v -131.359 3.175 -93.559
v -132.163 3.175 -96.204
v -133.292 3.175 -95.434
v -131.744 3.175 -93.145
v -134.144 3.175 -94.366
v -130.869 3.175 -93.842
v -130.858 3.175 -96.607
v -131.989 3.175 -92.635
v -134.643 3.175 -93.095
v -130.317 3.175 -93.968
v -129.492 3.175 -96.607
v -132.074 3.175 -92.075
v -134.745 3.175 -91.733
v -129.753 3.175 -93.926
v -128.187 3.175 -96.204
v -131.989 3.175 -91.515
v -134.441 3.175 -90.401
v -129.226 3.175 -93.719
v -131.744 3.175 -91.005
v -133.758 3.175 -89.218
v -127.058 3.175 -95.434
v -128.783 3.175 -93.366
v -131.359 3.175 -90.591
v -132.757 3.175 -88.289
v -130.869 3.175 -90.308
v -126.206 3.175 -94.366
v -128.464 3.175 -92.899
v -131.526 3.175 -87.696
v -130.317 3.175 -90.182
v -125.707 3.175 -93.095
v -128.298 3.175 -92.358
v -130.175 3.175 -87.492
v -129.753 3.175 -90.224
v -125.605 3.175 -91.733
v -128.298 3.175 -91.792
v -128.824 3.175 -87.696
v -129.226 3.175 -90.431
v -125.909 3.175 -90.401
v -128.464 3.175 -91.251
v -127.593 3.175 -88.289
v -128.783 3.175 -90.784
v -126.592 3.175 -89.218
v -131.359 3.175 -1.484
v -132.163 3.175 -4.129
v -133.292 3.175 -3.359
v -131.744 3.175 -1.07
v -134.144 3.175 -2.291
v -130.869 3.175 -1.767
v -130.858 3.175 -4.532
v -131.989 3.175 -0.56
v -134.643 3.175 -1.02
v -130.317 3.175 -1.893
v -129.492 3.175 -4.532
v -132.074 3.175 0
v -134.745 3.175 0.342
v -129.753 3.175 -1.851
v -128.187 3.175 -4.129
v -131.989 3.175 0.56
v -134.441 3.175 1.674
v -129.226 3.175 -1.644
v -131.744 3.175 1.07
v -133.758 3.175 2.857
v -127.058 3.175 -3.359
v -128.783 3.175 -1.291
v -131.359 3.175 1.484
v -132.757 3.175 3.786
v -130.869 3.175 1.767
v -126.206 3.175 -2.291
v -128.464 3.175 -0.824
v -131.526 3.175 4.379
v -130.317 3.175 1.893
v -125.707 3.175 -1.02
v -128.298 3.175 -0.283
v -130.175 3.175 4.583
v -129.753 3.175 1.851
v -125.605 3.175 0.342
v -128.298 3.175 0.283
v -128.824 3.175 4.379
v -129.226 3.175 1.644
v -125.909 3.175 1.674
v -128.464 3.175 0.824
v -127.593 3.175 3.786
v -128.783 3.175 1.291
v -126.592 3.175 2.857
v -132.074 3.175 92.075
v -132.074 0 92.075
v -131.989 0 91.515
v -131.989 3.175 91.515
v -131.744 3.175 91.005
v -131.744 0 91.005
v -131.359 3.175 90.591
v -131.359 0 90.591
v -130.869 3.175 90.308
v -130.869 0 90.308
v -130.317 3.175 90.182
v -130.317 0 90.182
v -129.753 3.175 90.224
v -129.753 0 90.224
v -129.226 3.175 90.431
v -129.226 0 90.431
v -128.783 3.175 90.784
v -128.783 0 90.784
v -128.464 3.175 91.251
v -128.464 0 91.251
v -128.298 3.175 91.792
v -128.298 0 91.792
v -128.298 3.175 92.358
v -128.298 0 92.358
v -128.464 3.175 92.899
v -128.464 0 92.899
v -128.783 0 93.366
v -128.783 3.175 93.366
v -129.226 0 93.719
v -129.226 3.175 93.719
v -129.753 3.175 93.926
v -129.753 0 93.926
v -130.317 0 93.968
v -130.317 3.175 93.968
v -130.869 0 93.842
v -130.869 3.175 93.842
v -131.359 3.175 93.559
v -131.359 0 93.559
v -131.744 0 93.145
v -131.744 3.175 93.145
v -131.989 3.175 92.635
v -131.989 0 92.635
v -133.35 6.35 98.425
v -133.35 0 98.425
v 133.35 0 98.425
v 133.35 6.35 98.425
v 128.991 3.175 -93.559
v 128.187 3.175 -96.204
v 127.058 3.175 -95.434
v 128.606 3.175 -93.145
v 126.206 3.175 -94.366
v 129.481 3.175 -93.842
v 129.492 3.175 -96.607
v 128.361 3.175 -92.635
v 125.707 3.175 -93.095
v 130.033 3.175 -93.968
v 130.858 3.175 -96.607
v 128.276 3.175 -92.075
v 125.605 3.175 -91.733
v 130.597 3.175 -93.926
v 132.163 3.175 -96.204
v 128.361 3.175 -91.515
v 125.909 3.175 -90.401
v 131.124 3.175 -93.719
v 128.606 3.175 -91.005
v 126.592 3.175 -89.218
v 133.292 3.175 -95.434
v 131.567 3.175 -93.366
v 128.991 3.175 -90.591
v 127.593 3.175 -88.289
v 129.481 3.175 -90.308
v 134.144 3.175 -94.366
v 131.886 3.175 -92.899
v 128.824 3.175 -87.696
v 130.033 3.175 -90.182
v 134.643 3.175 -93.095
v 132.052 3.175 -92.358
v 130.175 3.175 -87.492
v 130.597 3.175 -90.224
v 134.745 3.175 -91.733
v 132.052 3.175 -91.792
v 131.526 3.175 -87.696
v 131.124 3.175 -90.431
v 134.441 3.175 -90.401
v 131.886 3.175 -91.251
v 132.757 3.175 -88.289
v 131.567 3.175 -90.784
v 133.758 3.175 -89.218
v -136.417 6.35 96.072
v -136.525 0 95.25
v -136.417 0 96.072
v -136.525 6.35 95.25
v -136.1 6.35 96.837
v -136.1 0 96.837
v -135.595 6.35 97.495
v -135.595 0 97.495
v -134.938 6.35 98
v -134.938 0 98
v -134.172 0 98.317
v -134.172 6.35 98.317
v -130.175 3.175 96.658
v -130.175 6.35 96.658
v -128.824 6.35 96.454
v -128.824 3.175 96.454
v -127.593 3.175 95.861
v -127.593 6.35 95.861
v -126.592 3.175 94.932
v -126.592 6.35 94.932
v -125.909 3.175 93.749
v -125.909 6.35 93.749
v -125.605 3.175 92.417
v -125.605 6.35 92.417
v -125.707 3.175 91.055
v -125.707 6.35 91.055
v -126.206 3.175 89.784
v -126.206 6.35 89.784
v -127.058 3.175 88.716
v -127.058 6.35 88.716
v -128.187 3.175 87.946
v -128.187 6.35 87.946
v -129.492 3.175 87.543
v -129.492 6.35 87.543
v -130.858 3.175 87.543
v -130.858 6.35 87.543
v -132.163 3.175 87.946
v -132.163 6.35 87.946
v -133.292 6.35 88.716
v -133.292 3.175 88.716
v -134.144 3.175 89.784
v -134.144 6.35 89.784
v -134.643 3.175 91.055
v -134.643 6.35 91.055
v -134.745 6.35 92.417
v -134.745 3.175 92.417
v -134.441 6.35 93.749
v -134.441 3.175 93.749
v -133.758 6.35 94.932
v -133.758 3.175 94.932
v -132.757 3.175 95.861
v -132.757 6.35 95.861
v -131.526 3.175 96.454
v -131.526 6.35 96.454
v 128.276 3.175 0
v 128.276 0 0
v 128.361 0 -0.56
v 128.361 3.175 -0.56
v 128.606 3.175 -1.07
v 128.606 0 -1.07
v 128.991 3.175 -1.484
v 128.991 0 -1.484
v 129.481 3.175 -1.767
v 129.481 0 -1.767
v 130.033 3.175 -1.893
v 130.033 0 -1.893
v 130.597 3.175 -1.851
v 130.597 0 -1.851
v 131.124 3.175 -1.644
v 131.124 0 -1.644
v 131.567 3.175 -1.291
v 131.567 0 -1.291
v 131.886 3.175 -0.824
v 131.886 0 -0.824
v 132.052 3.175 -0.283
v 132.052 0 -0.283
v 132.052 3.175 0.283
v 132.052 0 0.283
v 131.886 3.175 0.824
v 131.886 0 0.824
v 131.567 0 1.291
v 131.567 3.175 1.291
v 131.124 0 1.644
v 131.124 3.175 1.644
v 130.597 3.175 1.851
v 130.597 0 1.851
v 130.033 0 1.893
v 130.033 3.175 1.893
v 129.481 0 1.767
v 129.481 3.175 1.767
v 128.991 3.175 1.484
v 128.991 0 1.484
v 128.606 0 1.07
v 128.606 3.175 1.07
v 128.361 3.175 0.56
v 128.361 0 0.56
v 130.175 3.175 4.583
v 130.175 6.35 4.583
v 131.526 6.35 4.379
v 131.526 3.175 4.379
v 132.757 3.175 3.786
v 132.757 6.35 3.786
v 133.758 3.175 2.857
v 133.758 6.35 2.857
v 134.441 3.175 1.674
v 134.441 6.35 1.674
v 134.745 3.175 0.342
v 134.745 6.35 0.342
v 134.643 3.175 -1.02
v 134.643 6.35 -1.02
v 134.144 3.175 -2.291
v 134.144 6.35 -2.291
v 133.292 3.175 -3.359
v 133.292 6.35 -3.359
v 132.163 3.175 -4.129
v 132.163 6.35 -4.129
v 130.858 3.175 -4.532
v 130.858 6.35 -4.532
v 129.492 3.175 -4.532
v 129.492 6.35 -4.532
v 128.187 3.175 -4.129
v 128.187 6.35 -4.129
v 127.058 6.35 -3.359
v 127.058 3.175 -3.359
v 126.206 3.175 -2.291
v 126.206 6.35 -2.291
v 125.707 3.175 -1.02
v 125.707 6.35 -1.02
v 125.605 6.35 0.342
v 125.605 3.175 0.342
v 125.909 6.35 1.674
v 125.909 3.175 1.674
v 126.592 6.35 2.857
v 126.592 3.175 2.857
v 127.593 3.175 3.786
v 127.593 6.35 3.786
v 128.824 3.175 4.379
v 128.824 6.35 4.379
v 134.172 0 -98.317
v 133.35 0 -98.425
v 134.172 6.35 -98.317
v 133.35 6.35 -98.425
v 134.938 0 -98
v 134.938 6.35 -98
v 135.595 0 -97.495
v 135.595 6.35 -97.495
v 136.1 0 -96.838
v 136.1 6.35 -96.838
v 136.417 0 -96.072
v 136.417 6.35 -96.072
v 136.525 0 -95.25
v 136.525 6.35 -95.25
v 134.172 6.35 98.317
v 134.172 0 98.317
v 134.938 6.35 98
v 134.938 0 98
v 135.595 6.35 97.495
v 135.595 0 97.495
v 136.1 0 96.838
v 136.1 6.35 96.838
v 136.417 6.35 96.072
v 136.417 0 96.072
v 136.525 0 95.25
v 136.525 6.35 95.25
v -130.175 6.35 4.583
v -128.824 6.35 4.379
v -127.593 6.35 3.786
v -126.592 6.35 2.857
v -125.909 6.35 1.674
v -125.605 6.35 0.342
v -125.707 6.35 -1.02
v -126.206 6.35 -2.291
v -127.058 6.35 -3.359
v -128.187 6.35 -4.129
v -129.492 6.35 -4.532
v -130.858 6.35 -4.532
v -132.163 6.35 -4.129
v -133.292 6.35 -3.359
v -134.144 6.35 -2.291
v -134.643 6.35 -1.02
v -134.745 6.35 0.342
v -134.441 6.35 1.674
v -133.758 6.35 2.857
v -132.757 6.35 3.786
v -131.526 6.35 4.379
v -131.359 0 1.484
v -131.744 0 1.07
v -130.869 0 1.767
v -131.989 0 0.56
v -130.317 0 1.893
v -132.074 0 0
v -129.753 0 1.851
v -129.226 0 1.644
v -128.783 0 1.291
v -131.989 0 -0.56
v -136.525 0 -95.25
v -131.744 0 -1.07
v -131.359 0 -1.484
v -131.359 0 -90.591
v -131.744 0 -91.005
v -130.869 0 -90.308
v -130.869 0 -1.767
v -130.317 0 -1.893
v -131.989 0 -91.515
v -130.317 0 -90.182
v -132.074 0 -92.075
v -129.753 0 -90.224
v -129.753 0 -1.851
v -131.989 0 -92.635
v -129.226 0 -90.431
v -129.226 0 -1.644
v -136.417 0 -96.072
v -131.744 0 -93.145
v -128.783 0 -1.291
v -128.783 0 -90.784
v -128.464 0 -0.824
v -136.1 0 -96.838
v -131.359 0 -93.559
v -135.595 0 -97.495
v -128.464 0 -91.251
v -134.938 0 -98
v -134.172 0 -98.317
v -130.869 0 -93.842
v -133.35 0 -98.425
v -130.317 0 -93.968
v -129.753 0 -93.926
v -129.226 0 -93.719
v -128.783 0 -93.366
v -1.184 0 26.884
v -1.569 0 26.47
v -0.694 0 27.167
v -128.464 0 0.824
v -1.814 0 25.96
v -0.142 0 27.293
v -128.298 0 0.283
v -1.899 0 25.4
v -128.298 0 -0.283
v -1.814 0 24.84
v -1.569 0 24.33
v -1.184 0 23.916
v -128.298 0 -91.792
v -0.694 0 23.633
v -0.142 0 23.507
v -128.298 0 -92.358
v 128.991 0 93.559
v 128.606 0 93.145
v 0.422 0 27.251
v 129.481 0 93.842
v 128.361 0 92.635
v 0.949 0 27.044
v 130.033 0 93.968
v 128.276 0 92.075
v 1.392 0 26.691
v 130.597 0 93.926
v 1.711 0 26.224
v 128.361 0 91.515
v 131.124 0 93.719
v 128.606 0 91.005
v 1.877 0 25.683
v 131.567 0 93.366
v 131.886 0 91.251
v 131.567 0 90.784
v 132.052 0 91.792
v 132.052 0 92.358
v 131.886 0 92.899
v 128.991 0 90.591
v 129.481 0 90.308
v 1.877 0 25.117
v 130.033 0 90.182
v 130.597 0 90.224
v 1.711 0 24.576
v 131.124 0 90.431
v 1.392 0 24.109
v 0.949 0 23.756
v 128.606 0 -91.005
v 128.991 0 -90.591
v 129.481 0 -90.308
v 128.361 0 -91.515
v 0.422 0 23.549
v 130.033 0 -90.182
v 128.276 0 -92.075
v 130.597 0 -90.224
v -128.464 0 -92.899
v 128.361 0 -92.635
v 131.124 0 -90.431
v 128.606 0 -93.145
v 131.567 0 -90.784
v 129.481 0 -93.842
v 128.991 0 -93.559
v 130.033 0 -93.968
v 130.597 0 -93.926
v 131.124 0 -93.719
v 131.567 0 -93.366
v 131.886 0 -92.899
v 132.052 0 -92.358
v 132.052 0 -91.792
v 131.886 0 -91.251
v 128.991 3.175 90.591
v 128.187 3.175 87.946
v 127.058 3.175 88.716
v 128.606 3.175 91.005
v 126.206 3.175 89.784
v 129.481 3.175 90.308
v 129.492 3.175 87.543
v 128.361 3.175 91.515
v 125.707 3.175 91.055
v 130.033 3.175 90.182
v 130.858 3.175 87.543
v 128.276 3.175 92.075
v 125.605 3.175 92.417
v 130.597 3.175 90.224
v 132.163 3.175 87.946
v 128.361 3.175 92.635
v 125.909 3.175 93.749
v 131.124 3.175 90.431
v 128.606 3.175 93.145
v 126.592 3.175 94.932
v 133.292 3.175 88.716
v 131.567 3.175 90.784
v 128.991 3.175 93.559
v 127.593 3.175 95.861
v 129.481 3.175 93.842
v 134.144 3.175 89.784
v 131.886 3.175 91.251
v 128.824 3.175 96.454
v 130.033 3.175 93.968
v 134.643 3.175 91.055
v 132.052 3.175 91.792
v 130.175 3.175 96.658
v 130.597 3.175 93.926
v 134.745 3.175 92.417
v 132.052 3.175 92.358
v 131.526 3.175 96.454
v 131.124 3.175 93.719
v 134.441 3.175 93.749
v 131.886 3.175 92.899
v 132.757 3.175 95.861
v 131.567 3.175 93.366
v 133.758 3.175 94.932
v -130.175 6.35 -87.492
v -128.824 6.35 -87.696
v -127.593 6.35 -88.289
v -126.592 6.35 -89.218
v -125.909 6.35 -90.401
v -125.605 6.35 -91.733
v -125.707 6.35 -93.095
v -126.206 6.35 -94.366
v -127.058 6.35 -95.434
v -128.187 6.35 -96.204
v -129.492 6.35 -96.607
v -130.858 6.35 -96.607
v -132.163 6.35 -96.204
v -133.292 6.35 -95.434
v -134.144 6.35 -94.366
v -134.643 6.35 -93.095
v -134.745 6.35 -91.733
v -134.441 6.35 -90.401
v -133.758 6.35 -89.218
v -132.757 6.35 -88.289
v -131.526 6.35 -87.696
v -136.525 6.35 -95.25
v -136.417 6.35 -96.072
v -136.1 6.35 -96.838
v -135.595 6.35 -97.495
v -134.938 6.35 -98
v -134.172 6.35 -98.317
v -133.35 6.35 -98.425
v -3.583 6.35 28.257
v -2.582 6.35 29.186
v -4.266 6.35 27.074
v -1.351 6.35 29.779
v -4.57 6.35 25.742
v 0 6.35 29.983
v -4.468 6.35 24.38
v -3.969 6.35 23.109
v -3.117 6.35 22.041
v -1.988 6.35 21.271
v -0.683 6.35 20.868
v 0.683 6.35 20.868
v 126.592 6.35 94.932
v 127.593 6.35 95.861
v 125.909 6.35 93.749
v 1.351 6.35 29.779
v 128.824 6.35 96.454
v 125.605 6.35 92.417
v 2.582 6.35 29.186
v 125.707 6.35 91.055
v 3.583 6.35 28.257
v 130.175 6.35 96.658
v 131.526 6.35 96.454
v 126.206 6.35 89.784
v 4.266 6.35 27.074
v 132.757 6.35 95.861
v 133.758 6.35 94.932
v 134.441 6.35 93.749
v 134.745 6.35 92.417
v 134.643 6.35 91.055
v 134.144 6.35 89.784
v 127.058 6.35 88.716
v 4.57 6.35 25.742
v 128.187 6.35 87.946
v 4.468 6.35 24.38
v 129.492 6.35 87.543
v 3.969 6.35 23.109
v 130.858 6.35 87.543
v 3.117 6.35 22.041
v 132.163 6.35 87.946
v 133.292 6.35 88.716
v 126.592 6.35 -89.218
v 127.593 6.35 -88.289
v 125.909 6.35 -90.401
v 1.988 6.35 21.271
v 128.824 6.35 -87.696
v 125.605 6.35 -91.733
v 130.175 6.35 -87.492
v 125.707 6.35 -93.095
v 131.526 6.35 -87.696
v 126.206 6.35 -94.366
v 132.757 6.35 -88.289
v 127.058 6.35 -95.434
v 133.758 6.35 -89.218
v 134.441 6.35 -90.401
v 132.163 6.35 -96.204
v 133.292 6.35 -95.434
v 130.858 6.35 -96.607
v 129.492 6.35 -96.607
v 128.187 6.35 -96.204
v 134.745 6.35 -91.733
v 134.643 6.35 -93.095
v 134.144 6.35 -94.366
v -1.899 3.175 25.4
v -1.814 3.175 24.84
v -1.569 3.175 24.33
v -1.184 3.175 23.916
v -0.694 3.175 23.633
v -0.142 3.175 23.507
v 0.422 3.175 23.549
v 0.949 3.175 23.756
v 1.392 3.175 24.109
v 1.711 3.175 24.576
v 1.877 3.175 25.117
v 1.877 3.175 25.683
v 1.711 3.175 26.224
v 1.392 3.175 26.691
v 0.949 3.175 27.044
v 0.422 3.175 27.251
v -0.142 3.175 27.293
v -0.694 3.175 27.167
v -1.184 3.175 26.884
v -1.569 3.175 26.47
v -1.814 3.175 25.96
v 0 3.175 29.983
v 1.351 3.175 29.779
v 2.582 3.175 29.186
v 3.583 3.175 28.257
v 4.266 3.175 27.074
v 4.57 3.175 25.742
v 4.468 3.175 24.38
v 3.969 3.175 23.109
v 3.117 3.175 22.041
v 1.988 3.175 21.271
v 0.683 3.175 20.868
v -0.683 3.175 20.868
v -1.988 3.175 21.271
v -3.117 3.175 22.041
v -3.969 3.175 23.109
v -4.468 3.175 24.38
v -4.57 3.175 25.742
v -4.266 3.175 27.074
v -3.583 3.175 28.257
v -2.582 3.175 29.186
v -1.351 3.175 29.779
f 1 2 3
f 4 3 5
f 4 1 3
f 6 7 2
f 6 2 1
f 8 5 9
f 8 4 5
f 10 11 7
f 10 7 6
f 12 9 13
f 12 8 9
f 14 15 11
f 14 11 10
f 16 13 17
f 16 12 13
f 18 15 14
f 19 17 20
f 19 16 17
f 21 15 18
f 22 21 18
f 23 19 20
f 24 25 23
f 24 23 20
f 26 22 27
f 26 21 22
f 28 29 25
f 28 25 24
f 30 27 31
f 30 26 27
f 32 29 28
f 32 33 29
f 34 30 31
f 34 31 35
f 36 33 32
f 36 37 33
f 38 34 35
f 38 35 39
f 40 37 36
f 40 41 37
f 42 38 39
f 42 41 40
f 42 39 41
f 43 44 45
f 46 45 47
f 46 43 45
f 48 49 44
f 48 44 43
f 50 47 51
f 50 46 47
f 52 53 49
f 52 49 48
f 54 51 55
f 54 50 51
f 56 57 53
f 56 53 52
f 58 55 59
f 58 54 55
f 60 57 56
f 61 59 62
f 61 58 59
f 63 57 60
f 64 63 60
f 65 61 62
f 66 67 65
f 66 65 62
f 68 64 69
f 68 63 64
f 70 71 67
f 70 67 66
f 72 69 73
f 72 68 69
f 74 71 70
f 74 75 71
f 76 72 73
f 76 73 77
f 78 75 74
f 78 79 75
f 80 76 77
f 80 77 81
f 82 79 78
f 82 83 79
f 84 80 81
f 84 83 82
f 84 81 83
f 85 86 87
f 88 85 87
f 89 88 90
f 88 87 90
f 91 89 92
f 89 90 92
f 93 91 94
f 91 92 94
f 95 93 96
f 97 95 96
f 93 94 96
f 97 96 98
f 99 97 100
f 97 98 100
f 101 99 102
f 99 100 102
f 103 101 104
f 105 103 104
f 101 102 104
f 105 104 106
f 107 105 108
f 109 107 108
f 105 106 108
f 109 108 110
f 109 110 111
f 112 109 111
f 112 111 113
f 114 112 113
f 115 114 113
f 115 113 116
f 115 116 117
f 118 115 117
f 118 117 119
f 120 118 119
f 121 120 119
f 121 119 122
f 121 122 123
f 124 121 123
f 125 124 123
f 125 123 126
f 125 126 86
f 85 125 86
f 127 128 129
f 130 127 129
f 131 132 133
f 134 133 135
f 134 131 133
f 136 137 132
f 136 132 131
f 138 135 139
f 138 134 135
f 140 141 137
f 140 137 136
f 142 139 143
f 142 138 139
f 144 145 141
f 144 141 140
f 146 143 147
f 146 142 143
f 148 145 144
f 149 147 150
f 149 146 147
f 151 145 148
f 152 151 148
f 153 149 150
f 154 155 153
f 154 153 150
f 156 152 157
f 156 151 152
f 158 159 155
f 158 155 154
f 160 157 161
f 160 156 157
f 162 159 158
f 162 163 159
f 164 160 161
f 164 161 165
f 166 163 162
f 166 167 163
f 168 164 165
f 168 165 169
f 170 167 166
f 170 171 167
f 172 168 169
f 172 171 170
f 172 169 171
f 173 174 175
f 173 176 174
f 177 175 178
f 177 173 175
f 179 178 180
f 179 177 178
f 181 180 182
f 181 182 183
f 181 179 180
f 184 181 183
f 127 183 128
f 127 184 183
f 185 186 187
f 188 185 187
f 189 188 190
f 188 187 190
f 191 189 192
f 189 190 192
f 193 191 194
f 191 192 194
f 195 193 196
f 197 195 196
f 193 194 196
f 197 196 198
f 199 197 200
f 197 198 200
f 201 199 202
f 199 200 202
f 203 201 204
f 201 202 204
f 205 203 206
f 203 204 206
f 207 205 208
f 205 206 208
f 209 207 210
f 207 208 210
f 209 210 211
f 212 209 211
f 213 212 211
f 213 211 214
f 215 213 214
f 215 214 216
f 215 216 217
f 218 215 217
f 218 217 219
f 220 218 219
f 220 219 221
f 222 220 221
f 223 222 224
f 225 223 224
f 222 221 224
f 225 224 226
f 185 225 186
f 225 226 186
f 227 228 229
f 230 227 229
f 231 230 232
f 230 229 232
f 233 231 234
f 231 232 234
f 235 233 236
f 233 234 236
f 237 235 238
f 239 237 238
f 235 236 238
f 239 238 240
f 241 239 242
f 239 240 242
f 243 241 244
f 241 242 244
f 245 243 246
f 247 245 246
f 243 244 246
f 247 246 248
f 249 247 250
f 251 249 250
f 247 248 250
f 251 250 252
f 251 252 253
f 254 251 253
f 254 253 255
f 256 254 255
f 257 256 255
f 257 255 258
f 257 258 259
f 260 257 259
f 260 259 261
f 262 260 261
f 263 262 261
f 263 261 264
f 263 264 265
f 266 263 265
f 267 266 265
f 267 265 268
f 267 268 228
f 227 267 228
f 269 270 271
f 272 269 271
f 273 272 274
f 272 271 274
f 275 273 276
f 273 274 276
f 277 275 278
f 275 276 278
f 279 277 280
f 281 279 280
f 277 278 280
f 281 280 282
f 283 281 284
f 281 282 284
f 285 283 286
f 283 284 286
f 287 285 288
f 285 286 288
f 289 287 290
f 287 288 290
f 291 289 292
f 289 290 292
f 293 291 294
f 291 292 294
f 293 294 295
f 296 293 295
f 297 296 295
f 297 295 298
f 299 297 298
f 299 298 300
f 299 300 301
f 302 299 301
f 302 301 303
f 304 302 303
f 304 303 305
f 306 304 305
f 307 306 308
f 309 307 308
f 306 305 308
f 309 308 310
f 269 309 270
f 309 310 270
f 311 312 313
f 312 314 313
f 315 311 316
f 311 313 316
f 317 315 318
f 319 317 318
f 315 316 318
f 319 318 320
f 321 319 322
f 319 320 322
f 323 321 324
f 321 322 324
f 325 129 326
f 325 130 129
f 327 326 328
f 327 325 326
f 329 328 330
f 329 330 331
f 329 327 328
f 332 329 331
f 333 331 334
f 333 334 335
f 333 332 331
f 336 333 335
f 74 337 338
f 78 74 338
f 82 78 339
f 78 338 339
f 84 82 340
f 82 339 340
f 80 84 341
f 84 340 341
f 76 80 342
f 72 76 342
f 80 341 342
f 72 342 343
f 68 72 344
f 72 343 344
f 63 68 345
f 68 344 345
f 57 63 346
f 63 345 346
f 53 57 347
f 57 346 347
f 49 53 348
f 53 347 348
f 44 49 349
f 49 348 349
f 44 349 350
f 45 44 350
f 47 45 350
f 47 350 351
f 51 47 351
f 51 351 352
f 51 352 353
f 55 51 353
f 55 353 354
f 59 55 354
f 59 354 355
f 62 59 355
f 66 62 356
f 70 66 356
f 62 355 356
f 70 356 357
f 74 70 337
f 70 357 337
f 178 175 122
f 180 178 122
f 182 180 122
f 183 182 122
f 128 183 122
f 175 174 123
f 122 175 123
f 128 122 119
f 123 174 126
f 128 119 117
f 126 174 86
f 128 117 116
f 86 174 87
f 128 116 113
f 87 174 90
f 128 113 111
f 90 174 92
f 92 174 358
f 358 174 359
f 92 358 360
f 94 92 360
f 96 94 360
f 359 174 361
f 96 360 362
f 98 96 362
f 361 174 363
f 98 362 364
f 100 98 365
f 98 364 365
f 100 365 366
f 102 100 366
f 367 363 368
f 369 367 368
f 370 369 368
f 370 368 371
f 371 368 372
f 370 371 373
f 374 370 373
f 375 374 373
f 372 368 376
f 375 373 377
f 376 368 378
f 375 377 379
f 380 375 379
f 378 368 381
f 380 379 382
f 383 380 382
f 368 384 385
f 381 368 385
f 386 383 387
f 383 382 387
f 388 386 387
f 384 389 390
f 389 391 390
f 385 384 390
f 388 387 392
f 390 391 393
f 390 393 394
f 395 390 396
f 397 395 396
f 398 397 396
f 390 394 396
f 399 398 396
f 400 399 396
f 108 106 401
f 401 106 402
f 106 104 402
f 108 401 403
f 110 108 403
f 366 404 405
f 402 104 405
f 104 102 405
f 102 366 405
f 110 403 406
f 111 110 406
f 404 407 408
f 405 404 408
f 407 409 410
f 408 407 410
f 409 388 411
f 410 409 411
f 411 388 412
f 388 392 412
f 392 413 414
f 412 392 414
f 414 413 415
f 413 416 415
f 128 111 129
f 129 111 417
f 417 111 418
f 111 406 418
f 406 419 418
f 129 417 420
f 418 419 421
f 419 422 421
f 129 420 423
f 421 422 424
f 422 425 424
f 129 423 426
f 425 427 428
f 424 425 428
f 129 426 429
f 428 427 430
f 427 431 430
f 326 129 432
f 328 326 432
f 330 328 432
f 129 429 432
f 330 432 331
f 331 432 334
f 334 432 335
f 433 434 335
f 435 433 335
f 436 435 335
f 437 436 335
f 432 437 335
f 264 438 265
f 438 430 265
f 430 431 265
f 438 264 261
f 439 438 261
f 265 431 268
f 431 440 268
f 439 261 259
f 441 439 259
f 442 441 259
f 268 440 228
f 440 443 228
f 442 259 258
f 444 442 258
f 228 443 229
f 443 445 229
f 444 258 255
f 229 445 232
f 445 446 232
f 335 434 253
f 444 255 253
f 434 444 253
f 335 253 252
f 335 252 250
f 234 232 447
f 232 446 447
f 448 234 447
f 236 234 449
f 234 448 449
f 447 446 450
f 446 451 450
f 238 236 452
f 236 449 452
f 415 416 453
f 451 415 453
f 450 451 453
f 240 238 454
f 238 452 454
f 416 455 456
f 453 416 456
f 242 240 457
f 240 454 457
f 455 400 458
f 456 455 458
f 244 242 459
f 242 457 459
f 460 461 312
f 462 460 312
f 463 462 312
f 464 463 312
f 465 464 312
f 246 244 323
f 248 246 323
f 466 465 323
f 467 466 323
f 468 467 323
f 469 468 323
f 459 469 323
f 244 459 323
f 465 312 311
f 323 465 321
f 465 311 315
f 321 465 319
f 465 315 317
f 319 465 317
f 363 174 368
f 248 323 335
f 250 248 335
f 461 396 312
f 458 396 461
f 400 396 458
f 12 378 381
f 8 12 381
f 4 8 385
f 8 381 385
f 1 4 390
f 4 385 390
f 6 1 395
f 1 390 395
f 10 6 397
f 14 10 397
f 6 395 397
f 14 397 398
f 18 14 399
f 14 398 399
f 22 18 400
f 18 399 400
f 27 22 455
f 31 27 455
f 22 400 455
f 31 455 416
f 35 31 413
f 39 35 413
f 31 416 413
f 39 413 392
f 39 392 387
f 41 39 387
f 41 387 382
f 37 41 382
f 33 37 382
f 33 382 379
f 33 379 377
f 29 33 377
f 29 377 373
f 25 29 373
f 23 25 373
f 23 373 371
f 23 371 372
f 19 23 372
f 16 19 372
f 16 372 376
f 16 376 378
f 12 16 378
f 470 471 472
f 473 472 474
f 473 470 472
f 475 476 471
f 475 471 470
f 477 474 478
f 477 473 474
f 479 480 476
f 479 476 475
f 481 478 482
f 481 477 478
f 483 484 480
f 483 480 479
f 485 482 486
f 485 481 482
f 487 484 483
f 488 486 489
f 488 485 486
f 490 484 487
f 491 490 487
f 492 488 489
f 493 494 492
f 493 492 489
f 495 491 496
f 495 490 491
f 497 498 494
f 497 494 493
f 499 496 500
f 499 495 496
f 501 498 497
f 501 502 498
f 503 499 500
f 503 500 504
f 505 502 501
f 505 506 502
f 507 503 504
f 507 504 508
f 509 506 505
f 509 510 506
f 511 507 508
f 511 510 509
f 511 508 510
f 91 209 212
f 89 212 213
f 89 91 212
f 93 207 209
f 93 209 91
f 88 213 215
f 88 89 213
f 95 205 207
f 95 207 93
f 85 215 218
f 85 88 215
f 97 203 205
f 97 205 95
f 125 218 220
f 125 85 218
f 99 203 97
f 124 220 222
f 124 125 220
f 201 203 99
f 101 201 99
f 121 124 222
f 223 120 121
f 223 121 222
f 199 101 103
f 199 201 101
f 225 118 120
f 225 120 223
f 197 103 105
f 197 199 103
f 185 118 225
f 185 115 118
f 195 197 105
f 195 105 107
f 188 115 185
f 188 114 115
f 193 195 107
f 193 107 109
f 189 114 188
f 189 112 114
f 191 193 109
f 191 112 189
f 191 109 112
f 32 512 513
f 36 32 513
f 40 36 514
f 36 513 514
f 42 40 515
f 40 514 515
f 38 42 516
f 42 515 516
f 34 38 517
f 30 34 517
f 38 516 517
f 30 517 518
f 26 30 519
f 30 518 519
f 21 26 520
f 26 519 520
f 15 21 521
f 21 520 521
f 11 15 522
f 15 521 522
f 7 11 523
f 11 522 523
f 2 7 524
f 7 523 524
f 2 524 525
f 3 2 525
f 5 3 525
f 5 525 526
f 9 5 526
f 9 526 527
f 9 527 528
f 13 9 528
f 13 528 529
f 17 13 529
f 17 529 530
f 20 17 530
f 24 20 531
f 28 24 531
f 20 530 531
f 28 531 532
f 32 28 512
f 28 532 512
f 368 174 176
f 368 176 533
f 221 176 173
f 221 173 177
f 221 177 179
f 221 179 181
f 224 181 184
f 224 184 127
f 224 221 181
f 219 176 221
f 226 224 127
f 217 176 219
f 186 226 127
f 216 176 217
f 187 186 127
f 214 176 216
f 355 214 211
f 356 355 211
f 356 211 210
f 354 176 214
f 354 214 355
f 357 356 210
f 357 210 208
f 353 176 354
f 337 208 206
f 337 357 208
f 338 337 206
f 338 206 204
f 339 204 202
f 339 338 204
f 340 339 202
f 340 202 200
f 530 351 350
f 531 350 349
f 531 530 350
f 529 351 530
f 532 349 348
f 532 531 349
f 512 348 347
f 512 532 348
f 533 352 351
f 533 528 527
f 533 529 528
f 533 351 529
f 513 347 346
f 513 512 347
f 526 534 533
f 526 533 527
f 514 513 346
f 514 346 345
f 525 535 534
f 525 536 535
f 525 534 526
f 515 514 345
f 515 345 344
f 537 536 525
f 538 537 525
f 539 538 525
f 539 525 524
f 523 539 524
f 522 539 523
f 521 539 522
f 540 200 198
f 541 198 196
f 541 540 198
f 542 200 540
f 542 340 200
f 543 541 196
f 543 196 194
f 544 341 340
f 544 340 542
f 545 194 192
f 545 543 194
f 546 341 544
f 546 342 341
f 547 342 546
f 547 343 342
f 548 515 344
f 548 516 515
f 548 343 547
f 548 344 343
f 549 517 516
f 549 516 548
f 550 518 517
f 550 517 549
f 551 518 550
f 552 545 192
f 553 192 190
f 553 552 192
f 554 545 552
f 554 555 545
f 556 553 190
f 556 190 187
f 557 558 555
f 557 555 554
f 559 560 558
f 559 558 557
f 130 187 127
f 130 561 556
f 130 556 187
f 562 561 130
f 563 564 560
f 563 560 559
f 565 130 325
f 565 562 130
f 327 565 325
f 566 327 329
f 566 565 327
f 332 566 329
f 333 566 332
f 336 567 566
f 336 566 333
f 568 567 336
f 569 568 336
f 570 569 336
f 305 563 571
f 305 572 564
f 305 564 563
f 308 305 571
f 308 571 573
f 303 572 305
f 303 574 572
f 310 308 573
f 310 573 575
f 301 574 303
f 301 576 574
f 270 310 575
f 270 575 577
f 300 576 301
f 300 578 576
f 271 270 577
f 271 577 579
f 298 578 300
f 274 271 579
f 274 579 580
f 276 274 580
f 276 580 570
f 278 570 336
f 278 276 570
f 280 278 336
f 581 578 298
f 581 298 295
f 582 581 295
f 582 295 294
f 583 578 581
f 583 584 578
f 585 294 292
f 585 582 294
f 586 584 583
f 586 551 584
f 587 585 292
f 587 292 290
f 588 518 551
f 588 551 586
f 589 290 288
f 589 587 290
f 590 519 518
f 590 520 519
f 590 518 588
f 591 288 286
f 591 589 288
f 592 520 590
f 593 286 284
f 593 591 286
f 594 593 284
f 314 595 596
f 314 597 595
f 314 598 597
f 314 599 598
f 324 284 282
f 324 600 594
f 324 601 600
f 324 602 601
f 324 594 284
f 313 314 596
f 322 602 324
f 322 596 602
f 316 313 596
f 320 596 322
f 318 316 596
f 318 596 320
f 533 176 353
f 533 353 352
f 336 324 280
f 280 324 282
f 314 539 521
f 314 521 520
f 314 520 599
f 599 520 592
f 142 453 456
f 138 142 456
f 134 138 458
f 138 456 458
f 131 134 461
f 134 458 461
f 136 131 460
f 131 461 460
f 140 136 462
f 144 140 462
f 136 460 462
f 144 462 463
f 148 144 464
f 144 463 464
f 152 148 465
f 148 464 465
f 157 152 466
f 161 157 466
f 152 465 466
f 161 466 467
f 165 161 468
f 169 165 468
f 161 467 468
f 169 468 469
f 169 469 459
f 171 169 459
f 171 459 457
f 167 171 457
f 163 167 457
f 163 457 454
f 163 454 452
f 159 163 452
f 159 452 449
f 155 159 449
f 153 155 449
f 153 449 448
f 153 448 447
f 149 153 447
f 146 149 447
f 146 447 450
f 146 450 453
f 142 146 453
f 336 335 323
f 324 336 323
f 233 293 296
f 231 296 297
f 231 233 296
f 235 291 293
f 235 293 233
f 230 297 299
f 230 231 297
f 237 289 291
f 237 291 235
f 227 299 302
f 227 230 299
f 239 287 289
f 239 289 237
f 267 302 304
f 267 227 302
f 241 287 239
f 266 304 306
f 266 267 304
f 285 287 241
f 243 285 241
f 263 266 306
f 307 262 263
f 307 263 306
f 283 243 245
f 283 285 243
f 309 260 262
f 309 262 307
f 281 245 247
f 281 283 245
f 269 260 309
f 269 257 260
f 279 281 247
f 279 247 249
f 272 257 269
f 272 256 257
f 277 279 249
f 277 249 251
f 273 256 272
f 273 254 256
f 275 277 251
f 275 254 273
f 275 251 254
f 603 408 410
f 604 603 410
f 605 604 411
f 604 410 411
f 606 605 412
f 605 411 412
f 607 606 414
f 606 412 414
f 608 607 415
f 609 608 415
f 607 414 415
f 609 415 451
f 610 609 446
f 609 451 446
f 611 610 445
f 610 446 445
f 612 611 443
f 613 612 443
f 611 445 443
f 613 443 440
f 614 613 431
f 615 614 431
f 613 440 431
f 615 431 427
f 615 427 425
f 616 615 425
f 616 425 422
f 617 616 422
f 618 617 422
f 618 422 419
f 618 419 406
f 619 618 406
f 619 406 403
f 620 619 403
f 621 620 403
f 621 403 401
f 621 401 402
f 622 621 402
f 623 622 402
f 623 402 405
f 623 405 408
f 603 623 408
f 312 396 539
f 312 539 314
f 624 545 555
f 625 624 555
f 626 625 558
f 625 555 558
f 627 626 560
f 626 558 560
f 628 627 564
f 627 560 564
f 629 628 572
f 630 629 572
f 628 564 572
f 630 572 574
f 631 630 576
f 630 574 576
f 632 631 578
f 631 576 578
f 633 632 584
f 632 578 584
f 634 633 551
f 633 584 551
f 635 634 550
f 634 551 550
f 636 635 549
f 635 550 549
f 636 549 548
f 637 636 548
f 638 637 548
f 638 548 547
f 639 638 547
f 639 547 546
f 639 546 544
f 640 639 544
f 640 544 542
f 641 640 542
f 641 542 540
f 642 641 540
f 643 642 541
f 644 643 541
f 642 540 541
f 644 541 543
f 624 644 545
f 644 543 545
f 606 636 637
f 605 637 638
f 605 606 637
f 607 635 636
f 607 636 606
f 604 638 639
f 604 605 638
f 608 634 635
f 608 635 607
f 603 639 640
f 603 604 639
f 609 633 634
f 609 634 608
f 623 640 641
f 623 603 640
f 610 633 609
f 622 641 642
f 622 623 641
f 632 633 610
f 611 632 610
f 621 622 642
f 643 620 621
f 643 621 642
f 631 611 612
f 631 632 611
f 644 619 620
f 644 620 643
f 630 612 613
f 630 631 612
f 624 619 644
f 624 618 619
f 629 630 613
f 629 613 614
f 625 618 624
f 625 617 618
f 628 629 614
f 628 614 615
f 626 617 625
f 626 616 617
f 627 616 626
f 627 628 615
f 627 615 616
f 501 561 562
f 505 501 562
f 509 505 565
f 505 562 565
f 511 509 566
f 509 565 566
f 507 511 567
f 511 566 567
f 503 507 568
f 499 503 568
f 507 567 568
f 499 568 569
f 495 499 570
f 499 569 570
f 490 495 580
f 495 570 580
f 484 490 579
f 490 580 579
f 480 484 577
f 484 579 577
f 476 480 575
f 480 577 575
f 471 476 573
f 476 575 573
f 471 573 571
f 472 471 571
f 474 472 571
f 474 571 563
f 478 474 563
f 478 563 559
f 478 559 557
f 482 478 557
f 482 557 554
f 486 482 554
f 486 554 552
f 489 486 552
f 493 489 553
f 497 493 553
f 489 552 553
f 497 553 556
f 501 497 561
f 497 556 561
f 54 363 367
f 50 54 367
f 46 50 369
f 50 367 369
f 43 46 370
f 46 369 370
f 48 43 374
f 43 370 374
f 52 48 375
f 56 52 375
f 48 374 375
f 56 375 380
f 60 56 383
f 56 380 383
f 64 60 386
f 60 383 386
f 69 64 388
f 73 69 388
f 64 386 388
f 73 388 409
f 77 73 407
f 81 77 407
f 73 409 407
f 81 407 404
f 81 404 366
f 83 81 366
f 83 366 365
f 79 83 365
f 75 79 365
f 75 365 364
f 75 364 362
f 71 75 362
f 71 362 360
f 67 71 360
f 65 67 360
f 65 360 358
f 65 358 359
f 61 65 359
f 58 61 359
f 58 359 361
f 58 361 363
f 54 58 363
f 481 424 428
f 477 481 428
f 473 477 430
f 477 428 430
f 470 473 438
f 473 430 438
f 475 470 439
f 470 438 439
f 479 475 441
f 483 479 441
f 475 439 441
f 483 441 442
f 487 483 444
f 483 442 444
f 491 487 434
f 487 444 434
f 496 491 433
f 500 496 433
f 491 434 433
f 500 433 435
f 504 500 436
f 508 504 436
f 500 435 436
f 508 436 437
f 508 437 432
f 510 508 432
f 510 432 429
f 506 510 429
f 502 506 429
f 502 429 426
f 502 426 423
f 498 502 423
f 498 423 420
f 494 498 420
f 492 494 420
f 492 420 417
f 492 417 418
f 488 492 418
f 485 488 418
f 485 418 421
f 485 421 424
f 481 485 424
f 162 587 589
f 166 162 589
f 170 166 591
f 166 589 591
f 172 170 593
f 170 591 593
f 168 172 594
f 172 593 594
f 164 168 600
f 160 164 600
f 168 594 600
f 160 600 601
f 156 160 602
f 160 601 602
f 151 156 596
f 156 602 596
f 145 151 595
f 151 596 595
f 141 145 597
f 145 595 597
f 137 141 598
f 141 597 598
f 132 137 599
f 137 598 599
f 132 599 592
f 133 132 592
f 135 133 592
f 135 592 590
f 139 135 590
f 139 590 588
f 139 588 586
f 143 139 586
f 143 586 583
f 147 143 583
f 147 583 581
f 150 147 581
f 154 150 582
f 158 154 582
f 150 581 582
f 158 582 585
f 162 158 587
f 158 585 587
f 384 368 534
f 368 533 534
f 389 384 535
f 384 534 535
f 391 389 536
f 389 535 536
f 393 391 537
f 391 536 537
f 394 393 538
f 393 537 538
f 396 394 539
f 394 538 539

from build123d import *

# Parameters (mm, degrees)
SKETCH1_W             = 273.05
SKETCH1_H             = 196.85
BOSS_EXTRUDE1_DEPTH   = 6.35
F_6_CLEARANCE_HOLE1_D = 3.7973
SKETCH4_R             = 4.582717762
CUT_EXTRUDE1_DEPTH    = 3.175
FILLET1_R             = 3.175


with BuildPart() as part:
    # Sketch1 → Boss-Extrude1 (new body)
    with BuildSketch(Plane(origin=(0, 0, 0), x_dir=(1, 0, 0), z_dir=(0, 1, 0))):
        Rectangle(SKETCH1_W, SKETCH1_H)
    extrude(amount=BOSS_EXTRUDE1_DEPTH)

    # #6 Clearance Hole1 (through all)
    with Locations(Plane(origin=(0, 6.35, 0), x_dir=(1, 0, 0), z_dir=(0, 1, 0))):
        with Locations((-130.175, 92.075), (130.175, 92.075), (130.175, -92.075), (-130.175, -92.075), (-130.175, 0), (130.175, 0), (0, -25.4)):
            Hole(F_6_CLEARANCE_HOLE1_D / 2)

    # Sketch4 → Cut-Extrude1 (cut)
    with BuildSketch(Plane(origin=(0, 6.35, 0), x_dir=(1, 0, 0), z_dir=(0, 1, 0))):
        with Locations(Location((-130.175, 92.075, 0), (0, 0, 270))):
            Circle(SKETCH4_R)
        with Locations(Location((130.175, 92.075, 0), (0, 0, 270))):
            Circle(SKETCH4_R)
        with Locations(Location((130.175, -92.075, 0), (0, 0, 270))):
            Circle(SKETCH4_R)
        with Locations(Location((-130.175, -92.075, 0), (0, 0, 270))):
            Circle(SKETCH4_R)
        with Locations(Location((-130.175, 0, 0), (0, 0, 270))):
            Circle(SKETCH4_R)
        with Locations(Location((130.175, 0, 0), (0, 0, 270))):
            Circle(SKETCH4_R)
        with Locations(Location((0, -25.4, 0), (0, 0, 270))):
            Circle(SKETCH4_R)
    extrude(amount=-CUT_EXTRUDE1_DEPTH, mode=Mode.SUBTRACT)

    # Fillet1
    fillet1_edges = [part.edges().sort_by_distance(p)[0] for p in [
        (136.525, 3.175, 98.425),
        (-136.525, 3.175, 98.425),
        (-136.525, 3.175, -98.425),
        (136.525, 3.175, -98.425),
    ]]
    fillet(fillet1_edges, radius=FILLET1_R)


solid = part.part
